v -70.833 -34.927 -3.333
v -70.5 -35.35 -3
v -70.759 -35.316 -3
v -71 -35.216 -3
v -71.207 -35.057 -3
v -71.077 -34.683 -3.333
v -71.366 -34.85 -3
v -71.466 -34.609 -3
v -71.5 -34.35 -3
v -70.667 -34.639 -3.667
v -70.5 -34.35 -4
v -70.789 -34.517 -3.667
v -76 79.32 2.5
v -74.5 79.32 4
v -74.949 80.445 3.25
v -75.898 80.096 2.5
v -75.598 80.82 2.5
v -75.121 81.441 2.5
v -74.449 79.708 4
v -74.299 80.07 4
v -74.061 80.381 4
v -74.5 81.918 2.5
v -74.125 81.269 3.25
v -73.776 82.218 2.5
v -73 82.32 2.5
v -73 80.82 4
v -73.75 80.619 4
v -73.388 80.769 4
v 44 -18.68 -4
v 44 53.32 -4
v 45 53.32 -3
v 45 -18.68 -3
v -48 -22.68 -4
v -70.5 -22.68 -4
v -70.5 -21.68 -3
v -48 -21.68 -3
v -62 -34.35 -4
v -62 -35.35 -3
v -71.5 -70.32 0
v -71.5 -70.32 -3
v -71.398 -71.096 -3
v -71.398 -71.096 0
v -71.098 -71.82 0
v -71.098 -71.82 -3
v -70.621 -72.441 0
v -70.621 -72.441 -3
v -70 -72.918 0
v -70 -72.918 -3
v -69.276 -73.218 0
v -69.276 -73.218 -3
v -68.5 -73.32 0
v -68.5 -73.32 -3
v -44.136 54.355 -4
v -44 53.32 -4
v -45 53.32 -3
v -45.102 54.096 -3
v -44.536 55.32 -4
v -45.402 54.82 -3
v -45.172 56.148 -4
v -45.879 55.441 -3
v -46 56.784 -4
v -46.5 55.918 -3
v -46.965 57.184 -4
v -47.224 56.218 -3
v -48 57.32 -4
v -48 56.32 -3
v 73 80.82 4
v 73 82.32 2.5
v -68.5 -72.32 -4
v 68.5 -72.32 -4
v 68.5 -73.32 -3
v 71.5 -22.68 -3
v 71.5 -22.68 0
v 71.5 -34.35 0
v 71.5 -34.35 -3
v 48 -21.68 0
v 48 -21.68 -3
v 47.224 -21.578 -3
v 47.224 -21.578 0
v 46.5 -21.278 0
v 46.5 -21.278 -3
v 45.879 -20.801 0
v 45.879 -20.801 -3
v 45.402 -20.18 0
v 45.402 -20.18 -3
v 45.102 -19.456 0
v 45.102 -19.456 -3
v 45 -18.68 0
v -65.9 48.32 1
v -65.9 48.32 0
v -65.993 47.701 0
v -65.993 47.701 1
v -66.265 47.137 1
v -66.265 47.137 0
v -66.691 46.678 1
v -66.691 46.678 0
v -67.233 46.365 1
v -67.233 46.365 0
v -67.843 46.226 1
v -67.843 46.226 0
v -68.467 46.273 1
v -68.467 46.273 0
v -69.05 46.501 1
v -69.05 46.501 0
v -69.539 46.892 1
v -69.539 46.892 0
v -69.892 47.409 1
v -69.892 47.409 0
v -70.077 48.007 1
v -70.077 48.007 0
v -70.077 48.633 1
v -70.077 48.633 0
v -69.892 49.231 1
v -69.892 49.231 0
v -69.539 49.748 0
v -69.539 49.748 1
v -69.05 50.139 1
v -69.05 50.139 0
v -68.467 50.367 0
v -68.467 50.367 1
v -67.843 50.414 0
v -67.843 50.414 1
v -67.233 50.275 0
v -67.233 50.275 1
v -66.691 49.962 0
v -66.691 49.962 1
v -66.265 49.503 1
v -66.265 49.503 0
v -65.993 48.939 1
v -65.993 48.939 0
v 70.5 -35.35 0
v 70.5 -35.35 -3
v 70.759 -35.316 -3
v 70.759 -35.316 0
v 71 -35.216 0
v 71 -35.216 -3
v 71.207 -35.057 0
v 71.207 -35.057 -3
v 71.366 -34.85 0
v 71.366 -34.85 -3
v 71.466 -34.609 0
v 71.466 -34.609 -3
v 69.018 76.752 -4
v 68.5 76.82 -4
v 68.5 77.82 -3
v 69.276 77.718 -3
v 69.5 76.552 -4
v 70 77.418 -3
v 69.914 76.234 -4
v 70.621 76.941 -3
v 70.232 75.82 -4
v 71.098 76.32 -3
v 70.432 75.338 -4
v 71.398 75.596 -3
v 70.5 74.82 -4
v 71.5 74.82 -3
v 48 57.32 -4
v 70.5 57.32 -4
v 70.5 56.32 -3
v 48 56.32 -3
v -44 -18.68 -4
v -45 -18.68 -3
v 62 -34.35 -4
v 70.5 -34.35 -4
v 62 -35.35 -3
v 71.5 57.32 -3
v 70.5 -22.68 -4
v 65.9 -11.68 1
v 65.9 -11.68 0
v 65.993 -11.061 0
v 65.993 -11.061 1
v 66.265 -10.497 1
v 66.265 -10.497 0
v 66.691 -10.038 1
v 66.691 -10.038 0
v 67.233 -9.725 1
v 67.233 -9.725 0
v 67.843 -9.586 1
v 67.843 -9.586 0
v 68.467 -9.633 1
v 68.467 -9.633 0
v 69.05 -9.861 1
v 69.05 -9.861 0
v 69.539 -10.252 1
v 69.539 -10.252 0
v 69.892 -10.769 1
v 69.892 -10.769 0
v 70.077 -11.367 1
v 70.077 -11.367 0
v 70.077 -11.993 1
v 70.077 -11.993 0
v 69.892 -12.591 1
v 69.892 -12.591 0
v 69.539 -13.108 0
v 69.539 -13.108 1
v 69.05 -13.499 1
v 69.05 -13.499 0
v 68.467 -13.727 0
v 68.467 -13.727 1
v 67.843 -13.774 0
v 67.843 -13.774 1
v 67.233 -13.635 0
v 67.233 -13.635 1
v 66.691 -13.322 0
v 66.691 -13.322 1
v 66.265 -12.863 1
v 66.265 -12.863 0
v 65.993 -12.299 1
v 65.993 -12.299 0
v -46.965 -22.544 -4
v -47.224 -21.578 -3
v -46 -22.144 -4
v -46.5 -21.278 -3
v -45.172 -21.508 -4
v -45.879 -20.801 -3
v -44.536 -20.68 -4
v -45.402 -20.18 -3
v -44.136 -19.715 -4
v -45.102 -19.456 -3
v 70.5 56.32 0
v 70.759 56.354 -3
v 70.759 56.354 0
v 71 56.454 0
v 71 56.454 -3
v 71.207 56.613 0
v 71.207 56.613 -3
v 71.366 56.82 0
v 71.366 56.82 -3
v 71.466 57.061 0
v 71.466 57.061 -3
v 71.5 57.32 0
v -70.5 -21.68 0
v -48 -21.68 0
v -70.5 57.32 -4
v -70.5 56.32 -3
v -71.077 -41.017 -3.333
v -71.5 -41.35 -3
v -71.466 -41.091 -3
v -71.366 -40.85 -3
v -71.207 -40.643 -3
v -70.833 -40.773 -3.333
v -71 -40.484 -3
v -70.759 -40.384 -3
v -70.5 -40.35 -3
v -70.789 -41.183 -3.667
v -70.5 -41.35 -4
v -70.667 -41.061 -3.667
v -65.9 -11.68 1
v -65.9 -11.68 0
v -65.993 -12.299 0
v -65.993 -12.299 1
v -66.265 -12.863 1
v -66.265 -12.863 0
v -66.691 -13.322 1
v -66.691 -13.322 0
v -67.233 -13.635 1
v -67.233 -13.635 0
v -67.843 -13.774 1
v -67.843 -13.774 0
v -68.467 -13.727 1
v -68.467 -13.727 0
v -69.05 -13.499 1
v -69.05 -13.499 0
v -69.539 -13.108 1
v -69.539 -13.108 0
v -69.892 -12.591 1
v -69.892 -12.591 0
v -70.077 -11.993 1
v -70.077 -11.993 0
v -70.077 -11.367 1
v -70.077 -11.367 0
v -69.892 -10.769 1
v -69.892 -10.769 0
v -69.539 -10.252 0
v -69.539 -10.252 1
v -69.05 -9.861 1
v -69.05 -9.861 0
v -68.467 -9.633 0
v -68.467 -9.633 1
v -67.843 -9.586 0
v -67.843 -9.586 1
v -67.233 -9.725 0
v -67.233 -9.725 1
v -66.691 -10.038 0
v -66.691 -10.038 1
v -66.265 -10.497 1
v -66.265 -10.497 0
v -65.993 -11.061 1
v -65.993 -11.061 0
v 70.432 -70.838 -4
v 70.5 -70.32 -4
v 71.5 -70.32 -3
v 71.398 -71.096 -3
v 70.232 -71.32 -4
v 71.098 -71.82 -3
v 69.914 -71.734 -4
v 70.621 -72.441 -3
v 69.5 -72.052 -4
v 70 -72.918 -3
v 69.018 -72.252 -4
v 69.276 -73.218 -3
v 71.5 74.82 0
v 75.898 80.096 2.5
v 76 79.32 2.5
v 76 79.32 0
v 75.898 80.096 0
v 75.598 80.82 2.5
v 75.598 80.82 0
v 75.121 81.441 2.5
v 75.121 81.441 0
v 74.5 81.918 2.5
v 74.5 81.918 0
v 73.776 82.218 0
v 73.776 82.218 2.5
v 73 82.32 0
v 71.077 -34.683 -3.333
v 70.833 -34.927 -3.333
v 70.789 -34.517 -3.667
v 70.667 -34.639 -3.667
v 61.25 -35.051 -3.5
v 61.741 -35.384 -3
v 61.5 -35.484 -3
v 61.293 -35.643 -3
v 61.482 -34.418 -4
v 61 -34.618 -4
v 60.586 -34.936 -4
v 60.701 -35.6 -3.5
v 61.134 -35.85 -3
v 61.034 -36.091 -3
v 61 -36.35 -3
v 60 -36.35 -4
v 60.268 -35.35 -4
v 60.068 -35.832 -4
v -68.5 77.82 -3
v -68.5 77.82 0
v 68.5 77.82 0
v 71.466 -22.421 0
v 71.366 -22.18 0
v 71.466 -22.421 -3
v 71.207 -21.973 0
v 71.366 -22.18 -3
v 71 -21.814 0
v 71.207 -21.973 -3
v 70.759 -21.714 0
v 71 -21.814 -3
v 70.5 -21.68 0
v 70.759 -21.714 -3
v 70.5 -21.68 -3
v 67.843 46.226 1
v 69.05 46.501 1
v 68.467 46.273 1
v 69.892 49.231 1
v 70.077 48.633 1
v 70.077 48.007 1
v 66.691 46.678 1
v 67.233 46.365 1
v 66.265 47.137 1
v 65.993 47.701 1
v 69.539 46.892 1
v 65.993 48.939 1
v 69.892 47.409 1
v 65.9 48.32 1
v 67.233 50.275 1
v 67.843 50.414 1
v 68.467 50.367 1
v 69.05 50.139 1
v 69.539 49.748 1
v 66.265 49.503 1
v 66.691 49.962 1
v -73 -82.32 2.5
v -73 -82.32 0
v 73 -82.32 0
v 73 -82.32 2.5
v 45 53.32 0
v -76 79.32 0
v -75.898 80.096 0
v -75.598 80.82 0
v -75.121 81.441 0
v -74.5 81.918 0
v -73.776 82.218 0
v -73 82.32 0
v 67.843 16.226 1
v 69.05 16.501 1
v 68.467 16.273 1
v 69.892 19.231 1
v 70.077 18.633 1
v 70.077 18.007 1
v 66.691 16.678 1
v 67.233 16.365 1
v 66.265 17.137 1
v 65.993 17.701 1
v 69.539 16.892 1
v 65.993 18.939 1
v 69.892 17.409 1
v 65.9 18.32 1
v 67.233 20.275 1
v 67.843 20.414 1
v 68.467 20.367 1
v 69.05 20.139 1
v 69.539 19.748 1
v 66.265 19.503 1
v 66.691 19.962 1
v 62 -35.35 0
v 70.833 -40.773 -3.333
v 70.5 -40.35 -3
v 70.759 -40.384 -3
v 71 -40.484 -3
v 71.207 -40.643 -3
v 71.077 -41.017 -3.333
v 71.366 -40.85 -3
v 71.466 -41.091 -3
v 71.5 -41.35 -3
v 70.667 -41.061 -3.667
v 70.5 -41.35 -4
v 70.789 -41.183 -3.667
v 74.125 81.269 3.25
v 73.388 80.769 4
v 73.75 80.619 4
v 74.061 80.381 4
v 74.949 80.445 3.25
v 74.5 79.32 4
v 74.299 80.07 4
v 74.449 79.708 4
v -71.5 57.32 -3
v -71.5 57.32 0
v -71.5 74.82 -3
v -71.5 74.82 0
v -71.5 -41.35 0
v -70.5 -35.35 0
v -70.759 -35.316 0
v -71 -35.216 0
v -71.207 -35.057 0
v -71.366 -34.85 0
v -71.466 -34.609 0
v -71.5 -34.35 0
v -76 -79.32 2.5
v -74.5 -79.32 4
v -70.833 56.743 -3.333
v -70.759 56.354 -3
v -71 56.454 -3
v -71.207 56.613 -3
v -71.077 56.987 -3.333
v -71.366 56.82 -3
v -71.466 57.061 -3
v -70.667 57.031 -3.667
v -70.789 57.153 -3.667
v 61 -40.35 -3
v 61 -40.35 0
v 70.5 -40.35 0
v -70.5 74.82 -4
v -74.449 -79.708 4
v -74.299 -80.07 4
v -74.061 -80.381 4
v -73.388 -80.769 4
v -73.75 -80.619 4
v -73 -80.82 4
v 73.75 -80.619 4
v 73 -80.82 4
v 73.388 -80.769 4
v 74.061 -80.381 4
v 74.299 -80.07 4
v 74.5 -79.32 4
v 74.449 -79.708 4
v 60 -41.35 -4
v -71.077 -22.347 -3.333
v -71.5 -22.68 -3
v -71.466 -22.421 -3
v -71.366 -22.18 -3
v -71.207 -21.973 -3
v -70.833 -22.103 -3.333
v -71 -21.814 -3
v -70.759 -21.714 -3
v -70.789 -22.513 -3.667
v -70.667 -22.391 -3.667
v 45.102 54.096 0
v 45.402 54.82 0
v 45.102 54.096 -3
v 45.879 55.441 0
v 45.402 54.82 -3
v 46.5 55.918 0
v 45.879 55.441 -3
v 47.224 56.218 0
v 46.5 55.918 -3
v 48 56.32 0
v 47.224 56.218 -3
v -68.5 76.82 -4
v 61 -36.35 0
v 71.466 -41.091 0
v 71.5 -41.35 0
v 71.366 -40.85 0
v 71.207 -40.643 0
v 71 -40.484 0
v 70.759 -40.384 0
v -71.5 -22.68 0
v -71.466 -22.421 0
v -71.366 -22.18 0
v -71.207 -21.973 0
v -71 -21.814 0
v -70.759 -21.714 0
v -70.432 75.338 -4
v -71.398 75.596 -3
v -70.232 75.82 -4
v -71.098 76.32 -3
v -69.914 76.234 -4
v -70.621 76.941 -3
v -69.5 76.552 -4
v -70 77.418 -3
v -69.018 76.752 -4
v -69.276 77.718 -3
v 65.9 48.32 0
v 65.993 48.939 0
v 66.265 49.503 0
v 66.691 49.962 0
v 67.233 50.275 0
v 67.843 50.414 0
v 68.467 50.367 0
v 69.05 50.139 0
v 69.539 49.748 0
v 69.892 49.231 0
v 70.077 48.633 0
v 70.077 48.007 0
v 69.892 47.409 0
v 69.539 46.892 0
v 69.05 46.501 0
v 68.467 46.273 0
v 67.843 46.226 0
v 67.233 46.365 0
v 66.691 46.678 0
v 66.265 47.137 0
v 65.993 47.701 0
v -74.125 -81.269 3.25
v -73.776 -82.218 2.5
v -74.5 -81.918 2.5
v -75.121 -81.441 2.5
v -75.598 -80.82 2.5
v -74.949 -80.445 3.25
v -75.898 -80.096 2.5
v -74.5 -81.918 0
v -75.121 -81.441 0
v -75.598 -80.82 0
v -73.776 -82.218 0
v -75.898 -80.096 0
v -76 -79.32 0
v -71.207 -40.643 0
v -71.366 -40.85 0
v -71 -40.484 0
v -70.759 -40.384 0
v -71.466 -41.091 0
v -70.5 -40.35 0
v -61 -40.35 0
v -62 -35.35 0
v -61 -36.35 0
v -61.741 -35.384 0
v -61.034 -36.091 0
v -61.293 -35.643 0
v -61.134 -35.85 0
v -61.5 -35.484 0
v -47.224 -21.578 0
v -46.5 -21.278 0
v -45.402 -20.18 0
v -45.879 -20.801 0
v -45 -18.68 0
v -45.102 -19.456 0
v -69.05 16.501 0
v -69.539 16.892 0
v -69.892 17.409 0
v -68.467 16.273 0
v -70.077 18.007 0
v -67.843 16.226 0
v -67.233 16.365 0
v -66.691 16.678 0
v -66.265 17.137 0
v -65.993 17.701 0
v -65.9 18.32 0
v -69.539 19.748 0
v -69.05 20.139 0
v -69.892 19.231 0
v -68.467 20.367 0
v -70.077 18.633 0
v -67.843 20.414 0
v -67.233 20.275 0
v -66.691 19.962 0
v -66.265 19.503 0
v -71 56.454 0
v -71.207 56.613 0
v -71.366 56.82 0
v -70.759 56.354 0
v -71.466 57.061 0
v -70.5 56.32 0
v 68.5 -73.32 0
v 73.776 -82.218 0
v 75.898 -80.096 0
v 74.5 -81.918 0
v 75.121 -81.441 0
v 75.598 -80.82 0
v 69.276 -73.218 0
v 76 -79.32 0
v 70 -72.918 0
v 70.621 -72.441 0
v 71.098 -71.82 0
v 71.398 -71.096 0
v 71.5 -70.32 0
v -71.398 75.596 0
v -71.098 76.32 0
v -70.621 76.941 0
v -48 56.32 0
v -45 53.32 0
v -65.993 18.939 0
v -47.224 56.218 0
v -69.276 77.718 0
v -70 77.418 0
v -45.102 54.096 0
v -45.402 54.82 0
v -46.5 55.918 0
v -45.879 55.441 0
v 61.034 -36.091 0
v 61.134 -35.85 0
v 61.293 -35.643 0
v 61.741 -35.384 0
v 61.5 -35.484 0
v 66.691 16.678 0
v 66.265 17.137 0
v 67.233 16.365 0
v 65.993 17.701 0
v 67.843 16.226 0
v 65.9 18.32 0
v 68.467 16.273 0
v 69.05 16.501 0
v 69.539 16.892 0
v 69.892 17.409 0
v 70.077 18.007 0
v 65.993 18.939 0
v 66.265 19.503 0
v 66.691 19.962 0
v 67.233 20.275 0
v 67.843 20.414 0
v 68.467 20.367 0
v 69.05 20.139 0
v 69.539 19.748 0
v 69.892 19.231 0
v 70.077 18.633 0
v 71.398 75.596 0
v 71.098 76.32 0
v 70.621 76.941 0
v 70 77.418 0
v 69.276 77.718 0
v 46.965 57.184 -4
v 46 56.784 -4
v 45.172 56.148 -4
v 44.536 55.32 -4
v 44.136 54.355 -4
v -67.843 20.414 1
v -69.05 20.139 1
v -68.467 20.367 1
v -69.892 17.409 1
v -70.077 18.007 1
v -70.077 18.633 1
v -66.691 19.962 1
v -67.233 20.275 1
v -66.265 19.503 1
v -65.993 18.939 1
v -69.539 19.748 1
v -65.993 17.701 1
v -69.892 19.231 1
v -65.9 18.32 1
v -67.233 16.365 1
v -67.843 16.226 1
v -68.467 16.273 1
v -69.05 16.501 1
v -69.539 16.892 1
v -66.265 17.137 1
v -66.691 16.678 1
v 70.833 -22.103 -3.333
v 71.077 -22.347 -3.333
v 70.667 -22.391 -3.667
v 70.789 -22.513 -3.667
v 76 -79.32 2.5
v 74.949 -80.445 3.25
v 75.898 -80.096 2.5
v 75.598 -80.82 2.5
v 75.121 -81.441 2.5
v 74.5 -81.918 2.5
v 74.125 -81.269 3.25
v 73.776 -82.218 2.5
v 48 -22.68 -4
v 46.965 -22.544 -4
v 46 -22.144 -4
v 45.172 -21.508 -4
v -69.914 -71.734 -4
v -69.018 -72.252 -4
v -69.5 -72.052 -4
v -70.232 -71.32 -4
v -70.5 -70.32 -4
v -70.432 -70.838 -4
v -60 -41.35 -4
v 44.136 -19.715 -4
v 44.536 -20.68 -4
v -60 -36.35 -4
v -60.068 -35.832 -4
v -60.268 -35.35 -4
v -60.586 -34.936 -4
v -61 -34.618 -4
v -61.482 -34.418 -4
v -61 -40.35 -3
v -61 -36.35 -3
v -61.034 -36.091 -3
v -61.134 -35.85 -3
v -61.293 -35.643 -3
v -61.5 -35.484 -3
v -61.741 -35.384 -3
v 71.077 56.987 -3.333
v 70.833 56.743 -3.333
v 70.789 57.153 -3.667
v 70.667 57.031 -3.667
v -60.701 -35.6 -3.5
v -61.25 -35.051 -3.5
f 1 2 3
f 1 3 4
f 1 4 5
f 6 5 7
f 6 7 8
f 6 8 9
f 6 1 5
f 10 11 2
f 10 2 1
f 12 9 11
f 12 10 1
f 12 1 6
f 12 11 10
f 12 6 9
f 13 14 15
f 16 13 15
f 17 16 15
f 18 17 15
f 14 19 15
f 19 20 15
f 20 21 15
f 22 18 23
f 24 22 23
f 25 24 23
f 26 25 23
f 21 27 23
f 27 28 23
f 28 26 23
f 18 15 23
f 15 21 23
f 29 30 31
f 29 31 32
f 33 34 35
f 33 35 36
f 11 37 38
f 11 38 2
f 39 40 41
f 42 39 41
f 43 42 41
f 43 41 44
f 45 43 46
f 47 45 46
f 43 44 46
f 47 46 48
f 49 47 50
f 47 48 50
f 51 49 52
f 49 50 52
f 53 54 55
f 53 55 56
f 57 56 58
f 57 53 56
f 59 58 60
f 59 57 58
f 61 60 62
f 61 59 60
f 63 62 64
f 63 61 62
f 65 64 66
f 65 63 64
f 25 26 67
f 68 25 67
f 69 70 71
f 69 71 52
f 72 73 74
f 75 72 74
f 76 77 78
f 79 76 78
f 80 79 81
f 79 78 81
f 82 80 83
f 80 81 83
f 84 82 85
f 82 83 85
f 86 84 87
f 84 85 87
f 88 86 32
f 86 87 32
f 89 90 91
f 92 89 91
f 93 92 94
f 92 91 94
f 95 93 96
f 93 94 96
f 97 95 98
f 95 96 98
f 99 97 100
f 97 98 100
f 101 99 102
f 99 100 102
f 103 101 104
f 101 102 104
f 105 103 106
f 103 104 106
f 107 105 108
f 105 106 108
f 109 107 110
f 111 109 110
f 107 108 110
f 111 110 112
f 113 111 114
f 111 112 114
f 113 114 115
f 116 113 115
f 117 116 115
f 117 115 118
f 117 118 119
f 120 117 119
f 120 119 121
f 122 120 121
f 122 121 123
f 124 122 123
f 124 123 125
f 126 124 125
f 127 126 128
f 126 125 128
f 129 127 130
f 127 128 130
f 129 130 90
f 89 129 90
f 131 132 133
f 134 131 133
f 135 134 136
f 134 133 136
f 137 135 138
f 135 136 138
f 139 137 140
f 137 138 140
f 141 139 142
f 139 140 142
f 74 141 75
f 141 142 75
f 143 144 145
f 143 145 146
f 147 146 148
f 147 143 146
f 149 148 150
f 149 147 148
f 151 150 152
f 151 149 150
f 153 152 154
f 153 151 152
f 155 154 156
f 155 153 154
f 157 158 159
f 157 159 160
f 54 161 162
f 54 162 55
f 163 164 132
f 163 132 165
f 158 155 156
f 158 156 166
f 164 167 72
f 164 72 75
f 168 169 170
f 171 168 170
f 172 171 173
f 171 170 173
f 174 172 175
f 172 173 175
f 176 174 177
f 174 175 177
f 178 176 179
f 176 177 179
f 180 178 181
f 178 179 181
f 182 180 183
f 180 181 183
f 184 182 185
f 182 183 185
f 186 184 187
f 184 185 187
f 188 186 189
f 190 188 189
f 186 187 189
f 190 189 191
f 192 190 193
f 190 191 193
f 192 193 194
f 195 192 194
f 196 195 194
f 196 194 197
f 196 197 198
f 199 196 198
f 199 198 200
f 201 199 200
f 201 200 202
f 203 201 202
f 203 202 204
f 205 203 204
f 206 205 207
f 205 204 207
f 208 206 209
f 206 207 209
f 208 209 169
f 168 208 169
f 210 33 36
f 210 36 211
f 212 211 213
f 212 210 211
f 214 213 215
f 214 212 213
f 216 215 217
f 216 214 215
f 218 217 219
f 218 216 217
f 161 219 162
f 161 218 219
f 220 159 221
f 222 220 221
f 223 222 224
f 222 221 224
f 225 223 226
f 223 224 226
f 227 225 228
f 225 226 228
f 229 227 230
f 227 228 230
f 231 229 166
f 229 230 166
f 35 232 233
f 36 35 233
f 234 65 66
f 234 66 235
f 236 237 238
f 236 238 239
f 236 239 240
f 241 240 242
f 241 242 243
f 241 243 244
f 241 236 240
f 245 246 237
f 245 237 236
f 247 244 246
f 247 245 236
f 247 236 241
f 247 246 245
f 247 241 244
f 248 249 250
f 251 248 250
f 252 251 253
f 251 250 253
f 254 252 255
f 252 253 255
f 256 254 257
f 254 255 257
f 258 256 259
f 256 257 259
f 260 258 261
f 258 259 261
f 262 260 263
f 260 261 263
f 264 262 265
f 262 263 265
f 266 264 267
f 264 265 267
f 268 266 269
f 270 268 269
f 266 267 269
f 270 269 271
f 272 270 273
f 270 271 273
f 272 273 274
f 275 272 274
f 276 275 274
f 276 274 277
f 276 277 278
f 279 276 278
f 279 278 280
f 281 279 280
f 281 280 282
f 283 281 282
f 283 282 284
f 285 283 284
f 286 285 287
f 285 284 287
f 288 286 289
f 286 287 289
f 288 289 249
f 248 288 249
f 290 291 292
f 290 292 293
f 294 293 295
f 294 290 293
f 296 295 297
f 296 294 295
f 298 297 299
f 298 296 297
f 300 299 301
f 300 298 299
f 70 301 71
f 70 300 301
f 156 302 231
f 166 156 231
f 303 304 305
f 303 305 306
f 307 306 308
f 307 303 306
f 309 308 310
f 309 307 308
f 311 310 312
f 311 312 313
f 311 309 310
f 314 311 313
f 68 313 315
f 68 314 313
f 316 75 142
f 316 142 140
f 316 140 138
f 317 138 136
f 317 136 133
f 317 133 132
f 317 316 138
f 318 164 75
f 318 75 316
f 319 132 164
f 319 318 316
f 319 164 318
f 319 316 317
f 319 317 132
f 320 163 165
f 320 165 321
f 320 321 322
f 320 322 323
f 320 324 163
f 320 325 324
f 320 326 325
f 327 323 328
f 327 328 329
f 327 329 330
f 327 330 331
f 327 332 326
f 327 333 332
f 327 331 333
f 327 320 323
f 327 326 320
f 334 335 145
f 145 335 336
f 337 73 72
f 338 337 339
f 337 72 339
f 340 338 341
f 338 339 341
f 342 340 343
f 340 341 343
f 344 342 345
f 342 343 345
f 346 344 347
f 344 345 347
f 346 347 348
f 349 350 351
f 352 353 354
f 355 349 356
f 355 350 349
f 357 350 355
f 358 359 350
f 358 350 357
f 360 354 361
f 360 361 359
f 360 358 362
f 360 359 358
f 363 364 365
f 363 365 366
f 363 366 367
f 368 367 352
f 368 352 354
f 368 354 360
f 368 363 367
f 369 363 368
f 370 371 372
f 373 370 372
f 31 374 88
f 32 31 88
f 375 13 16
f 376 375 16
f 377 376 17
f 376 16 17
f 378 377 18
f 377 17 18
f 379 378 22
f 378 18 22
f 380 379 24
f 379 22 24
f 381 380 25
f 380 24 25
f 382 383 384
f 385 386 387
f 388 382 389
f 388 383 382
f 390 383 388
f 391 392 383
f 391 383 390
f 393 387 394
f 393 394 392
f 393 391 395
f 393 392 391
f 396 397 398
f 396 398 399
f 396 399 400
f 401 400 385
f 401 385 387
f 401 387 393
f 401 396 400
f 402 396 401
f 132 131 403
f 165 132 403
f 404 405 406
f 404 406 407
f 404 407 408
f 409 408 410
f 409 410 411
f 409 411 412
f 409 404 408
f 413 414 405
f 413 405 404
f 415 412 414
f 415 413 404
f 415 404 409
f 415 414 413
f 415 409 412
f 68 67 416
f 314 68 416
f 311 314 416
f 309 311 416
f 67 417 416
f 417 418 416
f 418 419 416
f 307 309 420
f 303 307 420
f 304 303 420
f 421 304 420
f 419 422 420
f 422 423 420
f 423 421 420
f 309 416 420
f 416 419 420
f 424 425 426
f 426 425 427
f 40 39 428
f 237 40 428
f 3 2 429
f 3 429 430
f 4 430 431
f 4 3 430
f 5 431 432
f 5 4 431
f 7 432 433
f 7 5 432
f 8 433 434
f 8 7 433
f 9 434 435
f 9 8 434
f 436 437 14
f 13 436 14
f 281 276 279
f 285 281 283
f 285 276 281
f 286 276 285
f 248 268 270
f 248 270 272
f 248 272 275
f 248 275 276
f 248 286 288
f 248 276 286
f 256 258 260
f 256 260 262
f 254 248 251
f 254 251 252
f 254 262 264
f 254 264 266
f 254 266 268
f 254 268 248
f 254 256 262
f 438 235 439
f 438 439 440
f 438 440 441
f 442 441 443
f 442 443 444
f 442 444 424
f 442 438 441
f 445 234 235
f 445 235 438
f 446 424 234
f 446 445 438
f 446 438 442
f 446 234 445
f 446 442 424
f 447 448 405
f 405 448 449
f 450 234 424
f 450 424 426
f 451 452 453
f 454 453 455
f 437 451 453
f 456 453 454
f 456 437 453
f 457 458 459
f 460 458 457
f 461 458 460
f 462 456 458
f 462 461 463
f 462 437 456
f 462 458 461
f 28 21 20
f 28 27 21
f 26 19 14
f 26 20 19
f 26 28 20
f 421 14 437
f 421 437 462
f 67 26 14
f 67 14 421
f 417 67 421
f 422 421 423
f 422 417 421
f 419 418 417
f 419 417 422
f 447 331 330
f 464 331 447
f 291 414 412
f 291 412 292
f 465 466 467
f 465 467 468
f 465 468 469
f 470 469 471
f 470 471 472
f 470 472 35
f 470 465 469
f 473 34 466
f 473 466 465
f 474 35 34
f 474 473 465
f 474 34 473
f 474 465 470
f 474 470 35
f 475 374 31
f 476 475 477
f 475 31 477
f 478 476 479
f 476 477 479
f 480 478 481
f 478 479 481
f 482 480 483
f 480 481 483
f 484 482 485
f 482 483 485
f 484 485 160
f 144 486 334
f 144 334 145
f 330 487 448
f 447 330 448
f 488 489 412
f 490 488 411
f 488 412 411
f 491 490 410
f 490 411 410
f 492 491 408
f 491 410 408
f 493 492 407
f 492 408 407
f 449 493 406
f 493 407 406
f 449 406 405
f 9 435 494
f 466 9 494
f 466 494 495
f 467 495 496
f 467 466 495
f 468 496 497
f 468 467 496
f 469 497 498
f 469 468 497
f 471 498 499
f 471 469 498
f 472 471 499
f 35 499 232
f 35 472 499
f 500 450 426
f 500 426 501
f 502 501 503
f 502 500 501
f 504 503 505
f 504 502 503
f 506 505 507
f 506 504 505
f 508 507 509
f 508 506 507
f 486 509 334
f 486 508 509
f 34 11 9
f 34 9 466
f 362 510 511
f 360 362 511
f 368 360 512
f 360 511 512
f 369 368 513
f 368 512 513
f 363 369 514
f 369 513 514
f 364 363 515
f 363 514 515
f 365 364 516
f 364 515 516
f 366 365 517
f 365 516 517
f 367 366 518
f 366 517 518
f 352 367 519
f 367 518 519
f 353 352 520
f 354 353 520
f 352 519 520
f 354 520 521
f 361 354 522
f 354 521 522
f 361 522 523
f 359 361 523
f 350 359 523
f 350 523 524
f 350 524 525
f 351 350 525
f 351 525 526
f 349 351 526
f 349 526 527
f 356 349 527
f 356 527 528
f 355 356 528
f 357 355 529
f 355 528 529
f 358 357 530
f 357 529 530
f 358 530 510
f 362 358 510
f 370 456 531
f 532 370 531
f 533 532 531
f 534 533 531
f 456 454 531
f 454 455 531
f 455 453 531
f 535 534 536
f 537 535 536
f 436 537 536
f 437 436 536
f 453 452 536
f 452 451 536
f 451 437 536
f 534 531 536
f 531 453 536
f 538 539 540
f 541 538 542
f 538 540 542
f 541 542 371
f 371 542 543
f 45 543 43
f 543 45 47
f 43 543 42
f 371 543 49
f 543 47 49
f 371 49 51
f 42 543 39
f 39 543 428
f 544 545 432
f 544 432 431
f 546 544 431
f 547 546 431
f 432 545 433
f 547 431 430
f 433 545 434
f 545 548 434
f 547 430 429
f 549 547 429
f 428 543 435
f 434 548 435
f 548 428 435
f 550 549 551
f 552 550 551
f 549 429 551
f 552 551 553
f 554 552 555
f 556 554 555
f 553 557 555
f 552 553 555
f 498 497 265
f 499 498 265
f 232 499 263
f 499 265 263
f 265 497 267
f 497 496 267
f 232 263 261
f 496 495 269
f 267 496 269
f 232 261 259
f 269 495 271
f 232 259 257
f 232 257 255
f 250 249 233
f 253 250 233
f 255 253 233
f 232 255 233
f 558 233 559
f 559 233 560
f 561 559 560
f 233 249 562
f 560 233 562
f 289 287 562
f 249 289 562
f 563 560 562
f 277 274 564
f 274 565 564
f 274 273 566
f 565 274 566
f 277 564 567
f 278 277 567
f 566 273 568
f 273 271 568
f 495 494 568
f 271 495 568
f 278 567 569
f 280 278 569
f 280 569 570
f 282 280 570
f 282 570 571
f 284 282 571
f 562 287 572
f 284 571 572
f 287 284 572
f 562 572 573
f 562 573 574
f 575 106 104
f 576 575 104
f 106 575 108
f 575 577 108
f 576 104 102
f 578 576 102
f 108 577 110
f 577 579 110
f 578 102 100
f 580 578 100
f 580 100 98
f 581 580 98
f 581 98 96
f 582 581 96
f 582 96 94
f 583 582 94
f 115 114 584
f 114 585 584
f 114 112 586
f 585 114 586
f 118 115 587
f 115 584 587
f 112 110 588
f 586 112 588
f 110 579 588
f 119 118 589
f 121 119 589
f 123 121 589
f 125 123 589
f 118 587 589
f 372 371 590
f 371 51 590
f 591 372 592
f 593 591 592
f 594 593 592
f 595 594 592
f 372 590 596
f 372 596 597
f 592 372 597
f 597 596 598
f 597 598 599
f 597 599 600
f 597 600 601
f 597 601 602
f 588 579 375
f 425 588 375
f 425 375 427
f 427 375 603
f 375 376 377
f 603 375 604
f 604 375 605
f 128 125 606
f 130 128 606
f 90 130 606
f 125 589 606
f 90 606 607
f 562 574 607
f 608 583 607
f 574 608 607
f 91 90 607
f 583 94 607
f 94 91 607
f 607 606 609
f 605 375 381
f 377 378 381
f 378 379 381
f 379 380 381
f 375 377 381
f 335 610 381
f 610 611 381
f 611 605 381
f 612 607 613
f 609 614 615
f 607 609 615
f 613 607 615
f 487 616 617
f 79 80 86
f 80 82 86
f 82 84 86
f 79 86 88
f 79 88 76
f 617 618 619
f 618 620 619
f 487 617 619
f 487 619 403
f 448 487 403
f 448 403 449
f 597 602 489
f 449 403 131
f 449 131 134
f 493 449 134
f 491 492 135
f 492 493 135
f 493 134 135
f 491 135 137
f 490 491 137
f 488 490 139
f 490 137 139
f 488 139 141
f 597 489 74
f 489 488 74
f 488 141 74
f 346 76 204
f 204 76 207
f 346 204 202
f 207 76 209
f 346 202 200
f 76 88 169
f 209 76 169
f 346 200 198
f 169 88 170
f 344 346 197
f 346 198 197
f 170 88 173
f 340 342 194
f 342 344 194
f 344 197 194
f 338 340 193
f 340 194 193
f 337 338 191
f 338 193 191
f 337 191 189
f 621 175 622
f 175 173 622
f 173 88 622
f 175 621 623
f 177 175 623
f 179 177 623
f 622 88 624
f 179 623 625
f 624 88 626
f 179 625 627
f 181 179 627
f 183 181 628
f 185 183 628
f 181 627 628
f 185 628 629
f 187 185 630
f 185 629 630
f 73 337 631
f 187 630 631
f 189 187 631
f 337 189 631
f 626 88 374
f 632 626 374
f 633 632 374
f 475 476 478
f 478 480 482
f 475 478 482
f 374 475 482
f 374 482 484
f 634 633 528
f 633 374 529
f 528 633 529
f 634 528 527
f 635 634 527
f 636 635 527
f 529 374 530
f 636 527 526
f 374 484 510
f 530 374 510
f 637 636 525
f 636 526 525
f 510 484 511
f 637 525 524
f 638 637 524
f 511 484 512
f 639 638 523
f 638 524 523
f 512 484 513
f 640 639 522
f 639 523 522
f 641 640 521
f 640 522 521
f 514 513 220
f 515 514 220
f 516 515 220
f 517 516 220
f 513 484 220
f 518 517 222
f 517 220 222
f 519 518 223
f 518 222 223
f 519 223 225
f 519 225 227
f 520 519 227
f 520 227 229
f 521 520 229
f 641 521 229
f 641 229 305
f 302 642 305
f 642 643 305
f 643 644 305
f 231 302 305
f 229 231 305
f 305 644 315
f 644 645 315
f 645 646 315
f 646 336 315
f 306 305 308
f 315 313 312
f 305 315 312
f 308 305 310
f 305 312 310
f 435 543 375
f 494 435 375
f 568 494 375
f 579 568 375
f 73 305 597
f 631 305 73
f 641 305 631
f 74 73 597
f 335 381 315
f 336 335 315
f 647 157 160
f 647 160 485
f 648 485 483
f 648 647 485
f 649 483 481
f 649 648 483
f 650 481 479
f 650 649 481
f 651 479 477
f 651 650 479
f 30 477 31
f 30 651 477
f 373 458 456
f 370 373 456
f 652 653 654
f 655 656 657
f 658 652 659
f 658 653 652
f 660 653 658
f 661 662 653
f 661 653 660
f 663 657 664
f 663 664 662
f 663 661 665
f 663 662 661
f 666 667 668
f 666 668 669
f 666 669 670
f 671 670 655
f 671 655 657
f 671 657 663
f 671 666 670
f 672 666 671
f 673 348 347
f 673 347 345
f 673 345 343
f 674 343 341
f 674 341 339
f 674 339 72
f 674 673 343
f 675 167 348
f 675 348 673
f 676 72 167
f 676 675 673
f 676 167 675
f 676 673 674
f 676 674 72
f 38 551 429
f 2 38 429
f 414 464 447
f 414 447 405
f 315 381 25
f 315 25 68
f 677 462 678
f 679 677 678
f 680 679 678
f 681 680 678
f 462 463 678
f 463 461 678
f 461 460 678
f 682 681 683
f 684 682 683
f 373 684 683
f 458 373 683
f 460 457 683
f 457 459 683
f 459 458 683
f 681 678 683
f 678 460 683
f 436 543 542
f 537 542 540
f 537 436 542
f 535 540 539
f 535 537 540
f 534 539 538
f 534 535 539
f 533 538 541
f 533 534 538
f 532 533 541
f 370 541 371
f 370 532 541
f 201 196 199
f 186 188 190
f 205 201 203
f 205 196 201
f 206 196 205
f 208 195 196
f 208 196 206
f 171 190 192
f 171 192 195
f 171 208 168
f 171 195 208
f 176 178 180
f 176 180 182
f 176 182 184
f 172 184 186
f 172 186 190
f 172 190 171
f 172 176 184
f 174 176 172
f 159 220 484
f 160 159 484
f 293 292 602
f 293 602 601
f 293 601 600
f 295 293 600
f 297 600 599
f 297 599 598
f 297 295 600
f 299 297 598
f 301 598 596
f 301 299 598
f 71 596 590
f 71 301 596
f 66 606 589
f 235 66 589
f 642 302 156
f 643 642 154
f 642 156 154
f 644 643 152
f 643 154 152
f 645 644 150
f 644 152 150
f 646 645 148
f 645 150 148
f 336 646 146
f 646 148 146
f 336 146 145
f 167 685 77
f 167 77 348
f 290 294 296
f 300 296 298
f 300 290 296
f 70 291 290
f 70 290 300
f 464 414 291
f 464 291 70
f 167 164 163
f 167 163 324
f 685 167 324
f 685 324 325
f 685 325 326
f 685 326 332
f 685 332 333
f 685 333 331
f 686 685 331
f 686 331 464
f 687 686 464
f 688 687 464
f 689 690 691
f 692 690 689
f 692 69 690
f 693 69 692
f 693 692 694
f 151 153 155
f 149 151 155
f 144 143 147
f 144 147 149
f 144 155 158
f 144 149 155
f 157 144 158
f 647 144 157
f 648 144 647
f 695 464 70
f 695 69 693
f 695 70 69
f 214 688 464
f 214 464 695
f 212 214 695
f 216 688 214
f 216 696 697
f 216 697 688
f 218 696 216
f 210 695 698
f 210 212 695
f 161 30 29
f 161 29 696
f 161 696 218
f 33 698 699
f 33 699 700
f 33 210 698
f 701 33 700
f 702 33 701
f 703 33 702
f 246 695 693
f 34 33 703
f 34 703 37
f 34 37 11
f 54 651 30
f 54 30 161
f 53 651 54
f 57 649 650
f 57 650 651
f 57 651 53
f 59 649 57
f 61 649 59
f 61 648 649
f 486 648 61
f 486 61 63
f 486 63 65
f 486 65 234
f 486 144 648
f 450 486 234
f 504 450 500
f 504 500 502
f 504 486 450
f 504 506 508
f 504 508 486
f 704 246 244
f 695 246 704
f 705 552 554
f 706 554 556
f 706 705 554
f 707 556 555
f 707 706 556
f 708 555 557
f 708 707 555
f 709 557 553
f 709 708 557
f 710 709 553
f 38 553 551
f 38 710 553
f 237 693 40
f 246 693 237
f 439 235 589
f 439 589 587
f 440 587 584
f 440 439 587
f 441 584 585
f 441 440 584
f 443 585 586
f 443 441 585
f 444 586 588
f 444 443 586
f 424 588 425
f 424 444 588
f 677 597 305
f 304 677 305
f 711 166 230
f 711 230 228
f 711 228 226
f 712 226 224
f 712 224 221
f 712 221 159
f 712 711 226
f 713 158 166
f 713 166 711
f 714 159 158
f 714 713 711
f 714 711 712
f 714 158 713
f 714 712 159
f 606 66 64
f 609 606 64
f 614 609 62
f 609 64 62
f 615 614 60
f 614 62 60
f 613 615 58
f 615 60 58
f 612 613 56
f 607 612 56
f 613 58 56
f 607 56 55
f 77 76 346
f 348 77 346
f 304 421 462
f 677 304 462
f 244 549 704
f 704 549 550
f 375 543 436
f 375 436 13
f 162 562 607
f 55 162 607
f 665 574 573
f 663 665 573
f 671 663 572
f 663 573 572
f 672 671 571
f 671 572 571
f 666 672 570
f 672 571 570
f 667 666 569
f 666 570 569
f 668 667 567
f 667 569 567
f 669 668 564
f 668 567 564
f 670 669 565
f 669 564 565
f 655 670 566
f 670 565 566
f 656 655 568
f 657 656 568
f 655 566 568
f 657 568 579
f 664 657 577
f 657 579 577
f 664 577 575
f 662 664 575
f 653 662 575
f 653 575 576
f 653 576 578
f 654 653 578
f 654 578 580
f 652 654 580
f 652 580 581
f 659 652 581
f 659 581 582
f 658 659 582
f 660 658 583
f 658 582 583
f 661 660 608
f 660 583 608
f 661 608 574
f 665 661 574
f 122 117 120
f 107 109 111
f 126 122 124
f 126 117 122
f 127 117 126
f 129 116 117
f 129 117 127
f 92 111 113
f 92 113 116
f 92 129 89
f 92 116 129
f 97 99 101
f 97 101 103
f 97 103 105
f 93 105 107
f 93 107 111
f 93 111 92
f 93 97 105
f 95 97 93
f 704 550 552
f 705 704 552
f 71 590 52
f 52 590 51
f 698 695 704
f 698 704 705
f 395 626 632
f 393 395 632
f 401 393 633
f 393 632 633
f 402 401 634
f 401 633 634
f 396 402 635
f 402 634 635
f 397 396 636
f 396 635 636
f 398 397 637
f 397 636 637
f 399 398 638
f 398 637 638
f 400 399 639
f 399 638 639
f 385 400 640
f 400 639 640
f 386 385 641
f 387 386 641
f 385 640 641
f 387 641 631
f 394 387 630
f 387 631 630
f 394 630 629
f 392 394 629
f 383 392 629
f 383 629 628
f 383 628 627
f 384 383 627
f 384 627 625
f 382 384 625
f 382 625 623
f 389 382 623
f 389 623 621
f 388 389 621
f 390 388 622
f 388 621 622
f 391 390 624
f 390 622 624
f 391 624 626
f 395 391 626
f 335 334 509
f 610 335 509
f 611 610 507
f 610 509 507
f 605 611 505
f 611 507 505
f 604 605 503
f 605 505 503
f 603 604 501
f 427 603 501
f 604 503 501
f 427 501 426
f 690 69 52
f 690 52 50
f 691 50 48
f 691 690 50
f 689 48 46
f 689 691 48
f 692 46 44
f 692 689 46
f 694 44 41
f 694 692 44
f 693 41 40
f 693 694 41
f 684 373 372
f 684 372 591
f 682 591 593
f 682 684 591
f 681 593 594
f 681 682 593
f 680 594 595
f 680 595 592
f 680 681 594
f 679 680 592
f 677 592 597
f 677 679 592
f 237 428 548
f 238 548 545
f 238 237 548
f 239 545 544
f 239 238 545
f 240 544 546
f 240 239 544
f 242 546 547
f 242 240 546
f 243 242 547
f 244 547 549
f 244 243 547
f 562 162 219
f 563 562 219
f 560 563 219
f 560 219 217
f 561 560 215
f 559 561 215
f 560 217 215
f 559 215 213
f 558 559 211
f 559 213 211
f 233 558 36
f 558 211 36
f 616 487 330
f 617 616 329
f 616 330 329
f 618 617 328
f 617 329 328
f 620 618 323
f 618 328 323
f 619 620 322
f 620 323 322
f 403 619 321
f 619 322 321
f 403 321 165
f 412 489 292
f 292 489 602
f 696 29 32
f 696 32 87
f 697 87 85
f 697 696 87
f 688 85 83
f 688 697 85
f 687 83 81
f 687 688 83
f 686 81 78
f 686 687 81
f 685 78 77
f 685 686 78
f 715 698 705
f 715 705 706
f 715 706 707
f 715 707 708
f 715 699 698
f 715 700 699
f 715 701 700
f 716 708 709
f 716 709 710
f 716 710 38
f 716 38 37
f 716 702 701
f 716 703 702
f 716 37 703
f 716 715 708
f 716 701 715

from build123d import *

# Parameters (mm, degrees)
ESBO_O1_W                = 152
ESBO_O1_H                = 164.64
RESSALTO_EXTRUS_O1_DEPTH = 4
FILETE1_R                = 3
RESSALTO_EXTRUS_O2_DEPTH = 4
FILETE2_R                = 3
FILETE3_R                = 1
CHANFRO1_SIZE            = 1.5
CHANFRO2_SIZE            = 1
ESBO_O3_R                = 2.1
CORTE_EXTRUS_O1_DEPTH    = 1


with BuildPart() as part:
    # Esboço1 → Ressalto-extrusão1 (new body)
    with BuildSketch(Plane.XY):
        Rectangle(ESBO_O1_W, ESBO_O1_H)
    extrude(amount=RESSALTO_EXTRUS_O1_DEPTH)

    # Filete1
    filete1_edges = [part.edges().sort_by_distance(p)[0] for p in [
        (76, -82.32, 2),
        (-76, -82.32, 2),
        (-76, 82.32, 2),
        (76, 82.32, 2),
    ]]
    fillet(filete1_edges, radius=FILETE1_R)

    # Esboço2 → Ressalto-extrusão2 (add)
    with BuildSketch(Plane(origin=(0, 0, 0), x_dir=(-1, 0, 0), z_dir=(0, 0, -1))):
        Polygon((-71.5, -73.32), (71.5, -73.32), (71.5, -40.35), (61, -40.35), (61, -35.35), (71.5, -35.35), (71.5, -21.68), (45, -21.68), (45, 56.32), (71.5, 56.32), (71.5, 77.82), (-71.5, 77.82), (-71.5, 56.32), (-45, 56.32), (-45, -21.68), (-71.5, -21.68), (-71.5, -35.35), (-61, -35.35), (-61, -40.35), (-71.5, -40.35), align=None)
    extrude(amount=RESSALTO_EXTRUS_O2_DEPTH)

    # Filete2
    filete2_edges = [part.edges().sort_by_distance(p)[0] for p in [
        (-71.5, 77.82, -2),
        (71.5, 77.82, -2),
        (45, 56.32, -2),
        (45, -21.68, -2),
        (71.5, -73.32, -2),
        (-71.5, -73.32, -2),
        (-45, -21.68, -2),
        (-45, 56.32, -2),
    ]]
    fillet(filete2_edges, radius=FILETE2_R)

    # Filete3
    filete3_edges = [part.edges().sort_by_distance(p)[0] for p in [
        (-71.5, 56.32, -2),
        (71.5, 56.32, -2),
        (71.5, -21.68, -2),
        (71.5, -35.35, -2),
        (61, -35.35, -2),
        (71.5, -40.35, -2),
        (-71.5, -40.35, -2),
        (-61, -35.35, -2),
        (-71.5, -35.35, -2),
        (-71.5, -21.68, -2),
    ]]
    fillet(filete3_edges, radius=FILETE3_R)

    # Chanfro1
    chanfro1_edges = [part.edges().sort_by_distance(p)[0] for p in [
        (-76, 0, 4),
        (0, 82.32, 4),
        (76, 0, 4),
        (0, -82.32, 4),
        (75.121320344, 81.441320344, 4),
        (75.121320344, -81.441320344, 4),
        (-75.121320344, -81.441320344, 4),
        (-75.121320344, 81.441320344, 4),
    ]]
    chamfer(chanfro1_edges, length=CHANFRO1_SIZE)

    # Chanfro2
    chanfro2_edges = [part.edges().sort_by_distance(p)[0] for p in [
        (71.5, 66.07, -4),
        (0, 77.82, -4),
        (45, 17.32, -4),
        (59.25, -21.68, -4),
        (0, -73.32, -4),
        (-71.5, -55.835, -4),
        (-45, 17.32, -4),
        (-59.25, 56.32, -4),
        (70.621320344, -72.441320344, -4),
        (-70.621320344, -72.441320344, -4),
        (-70.621320344, 76.941320344, -4),
        (70.621320344, 76.941320344, -4),
        (45.878679656, 55.441320344, -4),
        (45.878679656, -20.801320344, -4),
        (-45.878679656, -20.801320344, -4),
        (-45.878679656, 55.441320344, -4),
        (-65.75, -40.35, -4),
        (59.25, 56.32, -4),
        (71.5, -28.515, -4),
        (66.25, -35.35, -4),
        (61, -38.35, -4),
        (71.5, -55.835, -4),
        (-66.25, -35.35, -4),
        (-71.5, -28.515, -4),
        (-59.25, -21.68, -4),
        (-71.5, 66.07, -4),
        (71.207106781, -35.057106781, -4),
        (71.207106781, -21.972893219, -4),
        (71.207106781, 56.612893219, -4),
        (-71.207106781, 56.612893219, -4),
        (-71.207106781, -21.972893219, -4),
        (-71.207106781, -35.057106781, -4),
        (71.207106781, -40.642893219, -4),
        (-71.207106781, -40.642893219, -4),
        (-61.292893219, -35.642893219, -4),
        (61.292893219, -35.642893219, -4),
        (65.75, -40.35, -4),
        (-61, -38.35, -4),
    ]]
    chamfer(chanfro2_edges, length=CHANFRO2_SIZE)

    # Esboço3 → Corte-extrusão1 (cut)
    with BuildSketch(Plane(origin=(0, 0, 0), x_dir=(-1, 0, 0), z_dir=(0, 0, -1))):
        with Locations((-68, 48.32)):
            Circle(ESBO_O3_R)
        with Locations((-68, -11.68)):
            Circle(ESBO_O3_R)
        with Locations((-68, 18.32)):
            Circle(ESBO_O3_R)
        with Locations(Location((68, 18.32, 0), (0, 0, 180))):
            Circle(ESBO_O3_R)
        with Locations(Location((68, -11.68, 0), (0, 0, 180))):
            Circle(ESBO_O3_R)
        with Locations(Location((68, 48.32, 0), (0, 0, 180))):
            Circle(ESBO_O3_R)
    extrude(amount=-CORTE_EXTRUS_O1_DEPTH, mode=Mode.SUBTRACT)


solid = part.part
